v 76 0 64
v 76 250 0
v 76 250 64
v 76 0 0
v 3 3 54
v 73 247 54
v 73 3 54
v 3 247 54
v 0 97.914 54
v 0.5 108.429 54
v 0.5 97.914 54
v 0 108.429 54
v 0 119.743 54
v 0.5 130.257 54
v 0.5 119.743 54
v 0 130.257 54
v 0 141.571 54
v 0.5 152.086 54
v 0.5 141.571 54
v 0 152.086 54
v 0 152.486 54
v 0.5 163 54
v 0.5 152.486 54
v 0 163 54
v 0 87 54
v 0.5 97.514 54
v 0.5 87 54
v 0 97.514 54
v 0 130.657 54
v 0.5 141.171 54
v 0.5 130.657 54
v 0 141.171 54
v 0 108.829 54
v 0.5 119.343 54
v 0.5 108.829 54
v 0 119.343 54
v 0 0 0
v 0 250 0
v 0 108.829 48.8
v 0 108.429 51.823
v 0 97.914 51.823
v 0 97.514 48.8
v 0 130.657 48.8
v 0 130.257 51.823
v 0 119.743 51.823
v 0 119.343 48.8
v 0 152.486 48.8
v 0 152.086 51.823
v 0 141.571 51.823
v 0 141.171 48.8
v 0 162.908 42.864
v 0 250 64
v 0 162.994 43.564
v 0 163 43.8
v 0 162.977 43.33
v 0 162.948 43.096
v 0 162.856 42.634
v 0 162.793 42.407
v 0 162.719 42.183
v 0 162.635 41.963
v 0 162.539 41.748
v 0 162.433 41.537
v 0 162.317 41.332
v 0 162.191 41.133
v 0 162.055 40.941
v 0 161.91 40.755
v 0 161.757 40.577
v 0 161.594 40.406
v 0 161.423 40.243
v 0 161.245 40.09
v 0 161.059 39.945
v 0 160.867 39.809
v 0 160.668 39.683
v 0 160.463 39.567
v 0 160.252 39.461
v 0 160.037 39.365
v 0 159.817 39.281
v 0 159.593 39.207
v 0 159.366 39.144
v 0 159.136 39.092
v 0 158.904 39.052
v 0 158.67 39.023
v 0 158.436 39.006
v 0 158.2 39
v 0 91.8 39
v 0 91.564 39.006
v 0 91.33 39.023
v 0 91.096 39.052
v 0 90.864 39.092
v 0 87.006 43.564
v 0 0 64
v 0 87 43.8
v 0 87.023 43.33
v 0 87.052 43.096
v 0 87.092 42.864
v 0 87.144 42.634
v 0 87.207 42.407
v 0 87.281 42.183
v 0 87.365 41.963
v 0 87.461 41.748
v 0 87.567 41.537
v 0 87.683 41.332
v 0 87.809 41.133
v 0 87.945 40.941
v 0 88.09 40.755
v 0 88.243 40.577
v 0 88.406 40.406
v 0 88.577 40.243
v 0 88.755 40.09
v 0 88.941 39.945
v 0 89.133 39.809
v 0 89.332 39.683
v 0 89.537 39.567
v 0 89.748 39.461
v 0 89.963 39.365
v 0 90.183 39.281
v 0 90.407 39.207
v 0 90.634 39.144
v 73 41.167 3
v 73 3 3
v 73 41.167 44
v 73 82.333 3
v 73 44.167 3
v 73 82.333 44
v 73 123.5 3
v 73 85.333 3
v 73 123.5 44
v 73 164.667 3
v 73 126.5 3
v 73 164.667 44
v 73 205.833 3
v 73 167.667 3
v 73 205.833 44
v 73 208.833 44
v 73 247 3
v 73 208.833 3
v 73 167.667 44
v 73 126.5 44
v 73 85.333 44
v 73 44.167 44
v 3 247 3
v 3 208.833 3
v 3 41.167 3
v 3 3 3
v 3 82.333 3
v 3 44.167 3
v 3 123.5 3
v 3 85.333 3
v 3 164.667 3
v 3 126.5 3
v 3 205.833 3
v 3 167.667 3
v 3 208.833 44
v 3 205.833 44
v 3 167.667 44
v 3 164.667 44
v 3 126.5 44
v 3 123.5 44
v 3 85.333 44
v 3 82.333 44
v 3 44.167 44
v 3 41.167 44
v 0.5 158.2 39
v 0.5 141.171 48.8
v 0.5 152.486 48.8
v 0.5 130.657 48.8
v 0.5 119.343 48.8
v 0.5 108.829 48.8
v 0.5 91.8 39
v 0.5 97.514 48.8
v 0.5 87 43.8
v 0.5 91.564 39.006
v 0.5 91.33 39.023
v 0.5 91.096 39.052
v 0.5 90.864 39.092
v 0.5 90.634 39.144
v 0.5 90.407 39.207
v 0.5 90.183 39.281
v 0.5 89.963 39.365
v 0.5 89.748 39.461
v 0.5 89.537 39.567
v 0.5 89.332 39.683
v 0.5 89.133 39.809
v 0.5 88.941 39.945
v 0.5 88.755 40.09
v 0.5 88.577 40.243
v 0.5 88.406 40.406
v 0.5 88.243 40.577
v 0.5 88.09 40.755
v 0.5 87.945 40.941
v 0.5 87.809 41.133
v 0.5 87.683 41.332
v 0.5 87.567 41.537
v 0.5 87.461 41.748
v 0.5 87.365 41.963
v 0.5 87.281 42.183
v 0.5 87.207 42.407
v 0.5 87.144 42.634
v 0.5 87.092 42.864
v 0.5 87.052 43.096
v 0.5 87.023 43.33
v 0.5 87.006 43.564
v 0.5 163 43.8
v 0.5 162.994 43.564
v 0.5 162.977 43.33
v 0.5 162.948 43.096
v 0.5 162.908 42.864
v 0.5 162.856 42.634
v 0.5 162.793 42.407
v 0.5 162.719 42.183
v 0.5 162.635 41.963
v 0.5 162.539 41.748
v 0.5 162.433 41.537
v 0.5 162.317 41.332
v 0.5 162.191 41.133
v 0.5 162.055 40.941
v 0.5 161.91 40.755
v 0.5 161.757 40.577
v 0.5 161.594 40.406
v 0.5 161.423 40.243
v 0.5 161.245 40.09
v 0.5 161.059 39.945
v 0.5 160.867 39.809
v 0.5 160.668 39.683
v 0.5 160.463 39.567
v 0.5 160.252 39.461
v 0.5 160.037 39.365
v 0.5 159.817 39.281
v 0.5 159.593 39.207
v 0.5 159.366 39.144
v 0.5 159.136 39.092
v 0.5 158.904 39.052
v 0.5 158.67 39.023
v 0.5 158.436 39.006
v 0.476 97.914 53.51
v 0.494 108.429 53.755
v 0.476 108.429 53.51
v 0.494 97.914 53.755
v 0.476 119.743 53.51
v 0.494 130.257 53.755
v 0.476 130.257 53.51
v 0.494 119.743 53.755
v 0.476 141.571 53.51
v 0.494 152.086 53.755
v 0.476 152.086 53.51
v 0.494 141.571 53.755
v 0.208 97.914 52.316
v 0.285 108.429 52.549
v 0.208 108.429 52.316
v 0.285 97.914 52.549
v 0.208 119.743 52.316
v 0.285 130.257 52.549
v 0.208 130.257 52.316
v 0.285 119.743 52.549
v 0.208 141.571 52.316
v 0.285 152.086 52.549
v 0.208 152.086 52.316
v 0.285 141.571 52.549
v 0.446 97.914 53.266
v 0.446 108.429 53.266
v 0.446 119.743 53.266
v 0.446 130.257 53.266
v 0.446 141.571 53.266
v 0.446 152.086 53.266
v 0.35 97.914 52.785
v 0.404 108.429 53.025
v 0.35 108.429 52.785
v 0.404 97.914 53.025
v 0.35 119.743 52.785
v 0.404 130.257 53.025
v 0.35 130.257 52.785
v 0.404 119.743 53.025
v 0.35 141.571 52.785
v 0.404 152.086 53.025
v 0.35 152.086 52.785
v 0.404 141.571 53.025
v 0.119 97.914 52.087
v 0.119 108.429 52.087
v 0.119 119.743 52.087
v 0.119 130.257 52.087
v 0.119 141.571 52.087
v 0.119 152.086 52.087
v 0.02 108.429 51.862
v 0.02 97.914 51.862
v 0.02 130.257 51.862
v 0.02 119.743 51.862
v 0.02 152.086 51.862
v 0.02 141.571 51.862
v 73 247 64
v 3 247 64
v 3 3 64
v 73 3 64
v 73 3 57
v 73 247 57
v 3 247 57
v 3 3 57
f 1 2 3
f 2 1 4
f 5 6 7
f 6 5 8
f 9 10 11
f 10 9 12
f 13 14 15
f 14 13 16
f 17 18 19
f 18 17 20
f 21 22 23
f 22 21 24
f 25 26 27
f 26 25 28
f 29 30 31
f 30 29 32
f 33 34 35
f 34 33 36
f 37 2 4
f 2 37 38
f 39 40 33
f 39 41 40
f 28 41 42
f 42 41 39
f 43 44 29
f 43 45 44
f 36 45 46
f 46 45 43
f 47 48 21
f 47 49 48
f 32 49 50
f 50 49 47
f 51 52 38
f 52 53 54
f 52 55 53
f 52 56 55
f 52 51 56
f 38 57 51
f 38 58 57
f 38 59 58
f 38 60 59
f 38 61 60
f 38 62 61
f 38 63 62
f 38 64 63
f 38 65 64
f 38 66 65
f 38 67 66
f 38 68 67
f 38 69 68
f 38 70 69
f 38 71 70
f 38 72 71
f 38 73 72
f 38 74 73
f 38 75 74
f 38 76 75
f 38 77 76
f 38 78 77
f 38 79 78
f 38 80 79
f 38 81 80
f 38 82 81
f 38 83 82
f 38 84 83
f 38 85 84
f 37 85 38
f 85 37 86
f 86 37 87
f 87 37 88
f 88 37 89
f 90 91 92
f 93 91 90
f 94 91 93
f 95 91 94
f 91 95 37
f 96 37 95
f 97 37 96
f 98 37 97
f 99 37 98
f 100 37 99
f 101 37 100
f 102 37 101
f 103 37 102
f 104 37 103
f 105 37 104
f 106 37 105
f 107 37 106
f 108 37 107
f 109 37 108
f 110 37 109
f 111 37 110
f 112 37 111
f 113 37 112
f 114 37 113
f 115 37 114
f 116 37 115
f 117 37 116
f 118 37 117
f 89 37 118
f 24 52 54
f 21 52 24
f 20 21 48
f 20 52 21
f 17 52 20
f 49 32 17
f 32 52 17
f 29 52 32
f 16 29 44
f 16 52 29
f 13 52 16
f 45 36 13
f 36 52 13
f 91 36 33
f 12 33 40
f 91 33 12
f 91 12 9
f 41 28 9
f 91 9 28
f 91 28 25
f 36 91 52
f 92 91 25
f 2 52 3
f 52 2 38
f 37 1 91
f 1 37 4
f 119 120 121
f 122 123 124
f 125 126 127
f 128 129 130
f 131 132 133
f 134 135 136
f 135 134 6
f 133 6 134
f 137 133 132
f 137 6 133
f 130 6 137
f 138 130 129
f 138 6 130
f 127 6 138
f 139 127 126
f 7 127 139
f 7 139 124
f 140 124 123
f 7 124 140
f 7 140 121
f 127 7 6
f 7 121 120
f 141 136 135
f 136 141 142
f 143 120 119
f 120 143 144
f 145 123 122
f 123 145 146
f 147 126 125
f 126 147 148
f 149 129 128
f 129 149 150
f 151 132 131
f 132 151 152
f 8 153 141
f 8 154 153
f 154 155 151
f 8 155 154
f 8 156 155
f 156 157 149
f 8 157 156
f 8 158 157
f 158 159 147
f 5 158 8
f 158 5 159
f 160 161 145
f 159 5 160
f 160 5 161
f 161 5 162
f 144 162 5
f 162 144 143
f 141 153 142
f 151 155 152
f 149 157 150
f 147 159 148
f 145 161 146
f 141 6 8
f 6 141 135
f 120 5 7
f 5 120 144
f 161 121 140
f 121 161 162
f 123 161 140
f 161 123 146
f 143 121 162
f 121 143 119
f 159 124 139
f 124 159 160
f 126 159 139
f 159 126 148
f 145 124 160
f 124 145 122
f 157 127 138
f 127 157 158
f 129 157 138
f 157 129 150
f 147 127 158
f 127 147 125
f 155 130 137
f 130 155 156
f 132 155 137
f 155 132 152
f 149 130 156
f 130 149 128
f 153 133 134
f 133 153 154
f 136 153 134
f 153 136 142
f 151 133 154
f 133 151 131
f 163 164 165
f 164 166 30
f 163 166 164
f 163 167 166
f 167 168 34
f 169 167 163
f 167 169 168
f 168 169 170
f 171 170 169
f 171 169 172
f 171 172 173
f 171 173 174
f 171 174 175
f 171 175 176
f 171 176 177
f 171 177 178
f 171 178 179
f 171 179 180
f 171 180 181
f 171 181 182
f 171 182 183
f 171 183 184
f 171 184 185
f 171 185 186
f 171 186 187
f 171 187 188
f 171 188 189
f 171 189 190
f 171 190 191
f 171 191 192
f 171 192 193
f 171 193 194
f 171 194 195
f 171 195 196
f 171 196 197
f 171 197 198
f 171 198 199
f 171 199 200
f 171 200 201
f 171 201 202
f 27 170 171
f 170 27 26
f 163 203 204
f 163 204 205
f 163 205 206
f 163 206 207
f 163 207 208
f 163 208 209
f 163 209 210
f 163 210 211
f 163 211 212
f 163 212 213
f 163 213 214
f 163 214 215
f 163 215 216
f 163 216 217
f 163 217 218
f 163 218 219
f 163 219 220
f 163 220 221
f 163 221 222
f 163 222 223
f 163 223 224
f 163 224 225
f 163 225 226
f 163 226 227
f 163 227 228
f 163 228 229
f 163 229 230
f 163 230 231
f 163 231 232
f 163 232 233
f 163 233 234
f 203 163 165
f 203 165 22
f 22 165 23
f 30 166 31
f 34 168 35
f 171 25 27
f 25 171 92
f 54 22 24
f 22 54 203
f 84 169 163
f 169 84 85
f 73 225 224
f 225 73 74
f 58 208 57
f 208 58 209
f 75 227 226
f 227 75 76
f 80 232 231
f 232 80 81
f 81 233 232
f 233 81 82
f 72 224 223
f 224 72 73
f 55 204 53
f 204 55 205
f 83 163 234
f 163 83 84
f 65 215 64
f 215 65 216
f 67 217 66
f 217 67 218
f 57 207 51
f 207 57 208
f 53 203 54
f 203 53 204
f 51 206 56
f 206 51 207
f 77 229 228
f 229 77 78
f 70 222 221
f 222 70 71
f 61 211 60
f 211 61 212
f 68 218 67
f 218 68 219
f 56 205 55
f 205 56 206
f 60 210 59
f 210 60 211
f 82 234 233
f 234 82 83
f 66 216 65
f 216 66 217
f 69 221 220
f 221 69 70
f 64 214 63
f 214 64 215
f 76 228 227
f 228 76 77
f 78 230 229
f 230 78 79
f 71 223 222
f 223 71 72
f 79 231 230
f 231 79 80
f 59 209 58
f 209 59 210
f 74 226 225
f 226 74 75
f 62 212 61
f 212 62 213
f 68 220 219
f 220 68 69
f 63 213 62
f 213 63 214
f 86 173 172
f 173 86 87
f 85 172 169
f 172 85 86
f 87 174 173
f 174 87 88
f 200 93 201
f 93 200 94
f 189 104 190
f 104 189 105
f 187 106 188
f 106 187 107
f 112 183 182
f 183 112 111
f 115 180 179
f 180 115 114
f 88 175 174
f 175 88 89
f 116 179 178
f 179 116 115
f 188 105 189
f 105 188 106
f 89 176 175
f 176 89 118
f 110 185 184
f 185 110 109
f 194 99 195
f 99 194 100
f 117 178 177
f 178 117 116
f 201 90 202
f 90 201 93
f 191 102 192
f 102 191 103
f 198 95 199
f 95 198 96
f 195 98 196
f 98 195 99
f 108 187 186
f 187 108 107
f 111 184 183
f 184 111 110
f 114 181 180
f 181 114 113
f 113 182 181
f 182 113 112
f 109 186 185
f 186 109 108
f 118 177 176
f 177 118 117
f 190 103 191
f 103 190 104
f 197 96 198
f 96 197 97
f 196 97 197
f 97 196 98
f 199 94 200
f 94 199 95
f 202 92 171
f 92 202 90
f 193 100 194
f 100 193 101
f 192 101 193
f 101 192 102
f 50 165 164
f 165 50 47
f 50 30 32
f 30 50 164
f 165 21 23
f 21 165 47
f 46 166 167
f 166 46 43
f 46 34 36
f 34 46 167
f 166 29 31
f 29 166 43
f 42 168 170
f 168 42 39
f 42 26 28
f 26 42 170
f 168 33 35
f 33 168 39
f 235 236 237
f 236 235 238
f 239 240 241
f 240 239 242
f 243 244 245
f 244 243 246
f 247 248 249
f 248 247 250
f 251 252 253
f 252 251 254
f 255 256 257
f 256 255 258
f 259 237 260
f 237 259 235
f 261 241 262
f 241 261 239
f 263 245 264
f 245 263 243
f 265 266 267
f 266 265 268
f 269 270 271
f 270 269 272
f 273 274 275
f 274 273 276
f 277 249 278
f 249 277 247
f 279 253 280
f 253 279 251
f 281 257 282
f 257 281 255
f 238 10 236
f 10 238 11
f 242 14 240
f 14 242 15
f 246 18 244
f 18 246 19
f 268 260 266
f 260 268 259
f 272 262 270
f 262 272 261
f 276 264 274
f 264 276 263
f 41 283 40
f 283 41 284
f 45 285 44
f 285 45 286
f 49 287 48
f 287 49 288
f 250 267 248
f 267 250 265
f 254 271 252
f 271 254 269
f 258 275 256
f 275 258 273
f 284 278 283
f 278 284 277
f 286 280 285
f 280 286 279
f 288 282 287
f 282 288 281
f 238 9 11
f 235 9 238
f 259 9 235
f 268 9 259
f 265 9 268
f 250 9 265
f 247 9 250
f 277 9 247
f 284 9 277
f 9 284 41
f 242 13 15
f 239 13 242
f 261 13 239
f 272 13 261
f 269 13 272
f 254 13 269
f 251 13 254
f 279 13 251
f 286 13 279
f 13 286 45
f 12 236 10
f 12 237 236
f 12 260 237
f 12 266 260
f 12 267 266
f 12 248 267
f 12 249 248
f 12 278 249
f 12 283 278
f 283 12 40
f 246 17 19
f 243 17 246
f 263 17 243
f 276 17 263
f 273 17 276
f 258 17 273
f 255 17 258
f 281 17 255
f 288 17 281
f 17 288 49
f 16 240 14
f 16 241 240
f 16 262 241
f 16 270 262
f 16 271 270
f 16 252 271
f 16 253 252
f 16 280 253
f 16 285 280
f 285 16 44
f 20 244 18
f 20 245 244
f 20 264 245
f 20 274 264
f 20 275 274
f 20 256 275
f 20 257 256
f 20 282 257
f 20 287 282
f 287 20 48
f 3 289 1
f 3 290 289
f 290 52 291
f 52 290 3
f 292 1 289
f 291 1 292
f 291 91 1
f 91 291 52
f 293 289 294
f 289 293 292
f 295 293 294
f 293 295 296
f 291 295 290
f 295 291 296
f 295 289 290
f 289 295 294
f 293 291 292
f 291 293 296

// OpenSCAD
use <parametric_butt_hinge.scad>;

// file card box (1 unit == 1mm)
// releases:
//
//      v 1.0 - initial release



/* [general] */
//the thickness of all walls
wallStrength = 3;

/* [file card] */
//file card height
fH = 52;
//file card height
fW = 74;
//the space between card and box (should not be zero)
space = 2;

/* [lid] */
//the height of the lid
lH = 10;

/* [Bottom] */
//should not be < 1
nrOfSeperators = 5;

/* [Hidden] */
//box dimensions
//box width
w = fW + space;
//box depth
d = 250 ; 
// box height
h = fH + space;

//spaceBetweenSeperators
sBS = (d - wallStrength * (2 + nrOfSeperators)) / (nrOfSeperators + 1);


module file_card_box_main(){

    difference(){
        boxBottom();

        translate([-wallStrength * 1.5, d/2, h]){
            rotate([180, 90, 0]){
                main();
            }
        }
    };

    translate ([0, 0, h]){
        boxTop();
    };
}


module boxBottom (){
    union() {
        union() {   
            difference() {
                
                //shell
                cube ([w, d, h]) ;
                
                //remove inside
                translate([wallStrength, wallStrength, wallStrength]){
                    cube ([w - wallStrength*2, d-wallStrength*2, h-wallStrength+00.1]);
                }
            };
            //seperators
            for (i=[0:nrOfSeperators - 1])
                // first wall + already set walls + the wall strength of the set walls
                translate([0, wallStrength + sBS + (i * sBS) + (i * wallStrength), 0]){
                    cube([w, wallStrength, h - lH]);
            }
        }
    }
}

module boxTop (){
    difference() {

        union() { 
            //shell
            cube ([w, d, lH]) ;

            translate([wallStrength / 2, wallStrength / 2, 0]) {
                cube([w - wallStrength, d - wallStrength, lH]);
            }
        }
        //remove inside
        translate([wallStrength, wallStrength, wallStrength]){
            cube ([w - wallStrength*2, d-wallStrength*2, h-wallStrength+0.1]);
        }
    };
}


//MAIN
file_card_box_main();
